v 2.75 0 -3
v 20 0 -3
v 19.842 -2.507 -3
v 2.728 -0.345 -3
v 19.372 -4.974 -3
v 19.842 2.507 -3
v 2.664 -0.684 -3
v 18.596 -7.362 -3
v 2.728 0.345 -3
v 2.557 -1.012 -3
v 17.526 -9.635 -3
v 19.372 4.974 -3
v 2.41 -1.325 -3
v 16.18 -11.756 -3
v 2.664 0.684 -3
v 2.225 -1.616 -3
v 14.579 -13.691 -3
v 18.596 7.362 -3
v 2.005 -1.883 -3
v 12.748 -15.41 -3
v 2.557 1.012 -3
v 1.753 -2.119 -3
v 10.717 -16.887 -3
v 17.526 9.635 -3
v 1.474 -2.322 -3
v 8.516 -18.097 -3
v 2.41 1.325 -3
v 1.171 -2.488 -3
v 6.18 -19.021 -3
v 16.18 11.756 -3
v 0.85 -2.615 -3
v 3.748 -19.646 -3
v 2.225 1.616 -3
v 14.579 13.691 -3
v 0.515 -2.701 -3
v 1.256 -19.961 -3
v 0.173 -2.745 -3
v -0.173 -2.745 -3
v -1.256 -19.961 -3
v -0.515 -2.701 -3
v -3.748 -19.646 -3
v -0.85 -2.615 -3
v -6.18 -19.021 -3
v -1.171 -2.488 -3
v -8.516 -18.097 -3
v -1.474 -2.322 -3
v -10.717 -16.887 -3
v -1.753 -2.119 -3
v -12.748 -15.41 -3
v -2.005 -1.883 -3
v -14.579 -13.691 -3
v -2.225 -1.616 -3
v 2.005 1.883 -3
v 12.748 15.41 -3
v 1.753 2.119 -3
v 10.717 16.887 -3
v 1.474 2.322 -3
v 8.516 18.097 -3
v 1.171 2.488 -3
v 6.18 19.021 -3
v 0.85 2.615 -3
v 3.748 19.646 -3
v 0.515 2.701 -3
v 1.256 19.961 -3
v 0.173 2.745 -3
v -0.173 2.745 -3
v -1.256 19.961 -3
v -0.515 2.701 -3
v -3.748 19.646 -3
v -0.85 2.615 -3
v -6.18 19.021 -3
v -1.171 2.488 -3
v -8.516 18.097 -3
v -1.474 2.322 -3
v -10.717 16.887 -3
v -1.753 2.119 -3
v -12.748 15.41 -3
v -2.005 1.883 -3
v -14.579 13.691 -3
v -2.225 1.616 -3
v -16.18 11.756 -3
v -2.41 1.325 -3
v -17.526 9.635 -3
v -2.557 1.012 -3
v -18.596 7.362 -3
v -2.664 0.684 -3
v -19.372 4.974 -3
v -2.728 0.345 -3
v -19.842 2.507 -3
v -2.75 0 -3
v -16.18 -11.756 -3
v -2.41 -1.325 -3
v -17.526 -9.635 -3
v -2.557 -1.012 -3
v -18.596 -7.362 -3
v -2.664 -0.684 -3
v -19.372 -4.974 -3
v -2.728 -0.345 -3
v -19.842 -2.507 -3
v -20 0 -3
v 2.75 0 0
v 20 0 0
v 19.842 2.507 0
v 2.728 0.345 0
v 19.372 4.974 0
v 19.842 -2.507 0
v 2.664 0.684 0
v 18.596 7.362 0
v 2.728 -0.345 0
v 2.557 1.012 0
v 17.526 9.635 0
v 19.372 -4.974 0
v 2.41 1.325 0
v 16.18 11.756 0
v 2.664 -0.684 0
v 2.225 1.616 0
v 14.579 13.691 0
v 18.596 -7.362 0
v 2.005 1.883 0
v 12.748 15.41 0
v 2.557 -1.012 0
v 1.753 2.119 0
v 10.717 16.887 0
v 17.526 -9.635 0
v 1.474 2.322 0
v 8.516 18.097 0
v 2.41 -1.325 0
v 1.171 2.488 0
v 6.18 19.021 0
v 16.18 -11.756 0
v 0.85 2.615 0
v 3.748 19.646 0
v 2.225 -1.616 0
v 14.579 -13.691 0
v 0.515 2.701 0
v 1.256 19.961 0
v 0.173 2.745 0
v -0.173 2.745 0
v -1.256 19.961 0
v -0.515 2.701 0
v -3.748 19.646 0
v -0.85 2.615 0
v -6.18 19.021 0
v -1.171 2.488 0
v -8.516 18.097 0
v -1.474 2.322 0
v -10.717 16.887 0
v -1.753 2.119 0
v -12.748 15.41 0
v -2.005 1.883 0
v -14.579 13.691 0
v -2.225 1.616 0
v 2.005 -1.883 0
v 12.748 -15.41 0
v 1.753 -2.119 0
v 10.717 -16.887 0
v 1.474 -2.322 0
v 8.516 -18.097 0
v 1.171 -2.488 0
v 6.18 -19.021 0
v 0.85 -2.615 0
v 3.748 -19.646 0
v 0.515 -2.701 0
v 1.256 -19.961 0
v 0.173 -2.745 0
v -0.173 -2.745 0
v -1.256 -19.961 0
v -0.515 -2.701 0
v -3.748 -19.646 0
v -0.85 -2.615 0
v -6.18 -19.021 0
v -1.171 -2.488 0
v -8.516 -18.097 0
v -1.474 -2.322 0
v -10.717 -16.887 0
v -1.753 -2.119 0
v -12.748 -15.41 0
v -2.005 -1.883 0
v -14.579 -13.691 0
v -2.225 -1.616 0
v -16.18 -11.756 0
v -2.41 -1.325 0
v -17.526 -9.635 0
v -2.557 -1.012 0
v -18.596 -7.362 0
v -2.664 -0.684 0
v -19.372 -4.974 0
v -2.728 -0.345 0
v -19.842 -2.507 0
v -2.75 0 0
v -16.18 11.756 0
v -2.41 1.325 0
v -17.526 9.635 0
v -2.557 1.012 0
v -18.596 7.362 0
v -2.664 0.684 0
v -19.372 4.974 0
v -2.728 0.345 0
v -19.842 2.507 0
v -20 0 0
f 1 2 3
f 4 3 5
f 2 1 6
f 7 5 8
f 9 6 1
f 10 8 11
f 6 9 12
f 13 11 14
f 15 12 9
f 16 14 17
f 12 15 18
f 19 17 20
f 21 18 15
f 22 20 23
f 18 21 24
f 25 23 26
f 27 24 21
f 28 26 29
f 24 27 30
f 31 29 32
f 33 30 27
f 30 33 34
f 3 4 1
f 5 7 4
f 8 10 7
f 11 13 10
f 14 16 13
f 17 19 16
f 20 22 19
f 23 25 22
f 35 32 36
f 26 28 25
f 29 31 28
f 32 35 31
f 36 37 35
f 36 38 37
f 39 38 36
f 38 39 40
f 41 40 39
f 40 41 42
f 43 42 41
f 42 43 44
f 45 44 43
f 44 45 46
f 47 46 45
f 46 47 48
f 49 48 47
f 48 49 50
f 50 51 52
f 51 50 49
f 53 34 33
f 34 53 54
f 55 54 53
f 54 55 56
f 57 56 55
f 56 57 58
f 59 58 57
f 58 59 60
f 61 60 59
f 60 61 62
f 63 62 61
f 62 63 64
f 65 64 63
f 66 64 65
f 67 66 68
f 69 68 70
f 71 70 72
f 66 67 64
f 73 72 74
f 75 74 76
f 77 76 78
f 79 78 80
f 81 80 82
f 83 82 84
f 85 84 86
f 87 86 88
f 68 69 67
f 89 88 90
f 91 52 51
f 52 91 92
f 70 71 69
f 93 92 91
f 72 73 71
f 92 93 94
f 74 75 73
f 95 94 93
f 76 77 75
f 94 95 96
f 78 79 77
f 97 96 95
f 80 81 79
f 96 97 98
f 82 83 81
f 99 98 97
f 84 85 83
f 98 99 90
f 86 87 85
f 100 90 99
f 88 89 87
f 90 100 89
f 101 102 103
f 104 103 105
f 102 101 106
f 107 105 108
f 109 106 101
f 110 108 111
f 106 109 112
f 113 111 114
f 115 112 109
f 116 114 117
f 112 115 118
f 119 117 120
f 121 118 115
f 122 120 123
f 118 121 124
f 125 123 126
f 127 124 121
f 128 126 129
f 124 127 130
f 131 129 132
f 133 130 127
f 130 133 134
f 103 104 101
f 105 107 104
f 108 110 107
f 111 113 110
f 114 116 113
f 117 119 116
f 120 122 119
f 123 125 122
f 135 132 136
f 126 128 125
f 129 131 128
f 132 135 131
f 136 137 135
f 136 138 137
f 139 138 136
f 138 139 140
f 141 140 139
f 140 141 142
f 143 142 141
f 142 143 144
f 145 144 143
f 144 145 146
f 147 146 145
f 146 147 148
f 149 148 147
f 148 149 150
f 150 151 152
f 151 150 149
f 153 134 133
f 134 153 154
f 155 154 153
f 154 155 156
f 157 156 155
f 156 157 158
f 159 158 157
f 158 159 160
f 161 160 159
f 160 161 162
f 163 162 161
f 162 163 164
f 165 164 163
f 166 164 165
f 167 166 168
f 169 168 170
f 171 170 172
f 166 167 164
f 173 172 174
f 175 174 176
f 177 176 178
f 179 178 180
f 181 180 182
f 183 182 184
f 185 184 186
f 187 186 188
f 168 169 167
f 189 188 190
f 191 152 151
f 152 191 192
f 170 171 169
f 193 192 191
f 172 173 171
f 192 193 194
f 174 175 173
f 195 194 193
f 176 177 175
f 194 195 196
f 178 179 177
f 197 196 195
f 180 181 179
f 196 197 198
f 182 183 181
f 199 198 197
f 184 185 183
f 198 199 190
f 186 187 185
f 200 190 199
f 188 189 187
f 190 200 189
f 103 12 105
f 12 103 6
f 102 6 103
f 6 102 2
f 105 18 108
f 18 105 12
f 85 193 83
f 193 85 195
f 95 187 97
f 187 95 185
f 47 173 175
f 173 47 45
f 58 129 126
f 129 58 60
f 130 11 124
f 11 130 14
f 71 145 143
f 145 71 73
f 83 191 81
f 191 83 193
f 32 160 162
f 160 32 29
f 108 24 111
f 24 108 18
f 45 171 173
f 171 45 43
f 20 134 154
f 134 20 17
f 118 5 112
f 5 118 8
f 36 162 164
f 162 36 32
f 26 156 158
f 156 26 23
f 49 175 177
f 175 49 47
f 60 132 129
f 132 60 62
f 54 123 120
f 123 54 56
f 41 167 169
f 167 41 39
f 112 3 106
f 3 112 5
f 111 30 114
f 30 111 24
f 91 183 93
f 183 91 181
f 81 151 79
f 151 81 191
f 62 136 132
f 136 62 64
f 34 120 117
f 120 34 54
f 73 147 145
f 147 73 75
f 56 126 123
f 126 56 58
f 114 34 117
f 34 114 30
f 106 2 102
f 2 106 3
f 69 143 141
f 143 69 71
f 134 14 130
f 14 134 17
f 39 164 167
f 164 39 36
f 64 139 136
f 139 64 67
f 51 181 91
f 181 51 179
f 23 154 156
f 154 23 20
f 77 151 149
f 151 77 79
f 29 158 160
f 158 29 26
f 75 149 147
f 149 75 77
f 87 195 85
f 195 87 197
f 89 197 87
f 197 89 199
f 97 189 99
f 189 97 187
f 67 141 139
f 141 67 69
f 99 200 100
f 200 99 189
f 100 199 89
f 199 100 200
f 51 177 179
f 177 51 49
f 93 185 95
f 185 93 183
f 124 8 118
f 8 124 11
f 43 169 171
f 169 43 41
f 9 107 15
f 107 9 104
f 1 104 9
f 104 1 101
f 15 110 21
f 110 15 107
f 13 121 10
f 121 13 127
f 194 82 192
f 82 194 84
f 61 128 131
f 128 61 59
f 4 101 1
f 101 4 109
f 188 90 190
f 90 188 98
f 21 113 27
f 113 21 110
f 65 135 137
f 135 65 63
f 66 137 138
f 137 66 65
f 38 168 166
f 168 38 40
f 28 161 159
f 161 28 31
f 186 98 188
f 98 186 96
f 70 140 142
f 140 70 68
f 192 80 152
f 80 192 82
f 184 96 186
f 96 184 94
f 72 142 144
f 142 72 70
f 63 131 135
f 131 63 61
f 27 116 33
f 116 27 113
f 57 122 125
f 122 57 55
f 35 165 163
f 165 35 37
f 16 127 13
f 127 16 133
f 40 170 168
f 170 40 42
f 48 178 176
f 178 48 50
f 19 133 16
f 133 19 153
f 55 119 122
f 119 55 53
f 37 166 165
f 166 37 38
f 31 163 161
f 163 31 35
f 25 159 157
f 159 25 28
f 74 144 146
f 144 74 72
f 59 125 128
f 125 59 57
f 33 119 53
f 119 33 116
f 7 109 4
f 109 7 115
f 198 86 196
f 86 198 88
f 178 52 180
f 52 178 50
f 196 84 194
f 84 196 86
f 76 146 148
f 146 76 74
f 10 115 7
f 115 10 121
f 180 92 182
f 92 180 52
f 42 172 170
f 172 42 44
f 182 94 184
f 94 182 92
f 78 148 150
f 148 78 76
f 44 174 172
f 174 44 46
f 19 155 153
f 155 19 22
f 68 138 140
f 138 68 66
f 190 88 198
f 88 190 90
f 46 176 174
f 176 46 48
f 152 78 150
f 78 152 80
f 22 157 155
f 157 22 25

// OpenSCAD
$fn = 50;


difference() {
	union() {
		translate(v = [0, 0, -3.0000000000]) {
			cylinder(h = 3, r = 10.0000000000);
		}
		translate(v = [0, 0, -3.0000000000]) {
			cylinder(h = 3, r = 20.0000000000);
		}
	}
	union() {
		#translate(v = [0, 0, -3]) {
			cylinder(h = 3, r = 2.7500000000);
		}
	}
}
